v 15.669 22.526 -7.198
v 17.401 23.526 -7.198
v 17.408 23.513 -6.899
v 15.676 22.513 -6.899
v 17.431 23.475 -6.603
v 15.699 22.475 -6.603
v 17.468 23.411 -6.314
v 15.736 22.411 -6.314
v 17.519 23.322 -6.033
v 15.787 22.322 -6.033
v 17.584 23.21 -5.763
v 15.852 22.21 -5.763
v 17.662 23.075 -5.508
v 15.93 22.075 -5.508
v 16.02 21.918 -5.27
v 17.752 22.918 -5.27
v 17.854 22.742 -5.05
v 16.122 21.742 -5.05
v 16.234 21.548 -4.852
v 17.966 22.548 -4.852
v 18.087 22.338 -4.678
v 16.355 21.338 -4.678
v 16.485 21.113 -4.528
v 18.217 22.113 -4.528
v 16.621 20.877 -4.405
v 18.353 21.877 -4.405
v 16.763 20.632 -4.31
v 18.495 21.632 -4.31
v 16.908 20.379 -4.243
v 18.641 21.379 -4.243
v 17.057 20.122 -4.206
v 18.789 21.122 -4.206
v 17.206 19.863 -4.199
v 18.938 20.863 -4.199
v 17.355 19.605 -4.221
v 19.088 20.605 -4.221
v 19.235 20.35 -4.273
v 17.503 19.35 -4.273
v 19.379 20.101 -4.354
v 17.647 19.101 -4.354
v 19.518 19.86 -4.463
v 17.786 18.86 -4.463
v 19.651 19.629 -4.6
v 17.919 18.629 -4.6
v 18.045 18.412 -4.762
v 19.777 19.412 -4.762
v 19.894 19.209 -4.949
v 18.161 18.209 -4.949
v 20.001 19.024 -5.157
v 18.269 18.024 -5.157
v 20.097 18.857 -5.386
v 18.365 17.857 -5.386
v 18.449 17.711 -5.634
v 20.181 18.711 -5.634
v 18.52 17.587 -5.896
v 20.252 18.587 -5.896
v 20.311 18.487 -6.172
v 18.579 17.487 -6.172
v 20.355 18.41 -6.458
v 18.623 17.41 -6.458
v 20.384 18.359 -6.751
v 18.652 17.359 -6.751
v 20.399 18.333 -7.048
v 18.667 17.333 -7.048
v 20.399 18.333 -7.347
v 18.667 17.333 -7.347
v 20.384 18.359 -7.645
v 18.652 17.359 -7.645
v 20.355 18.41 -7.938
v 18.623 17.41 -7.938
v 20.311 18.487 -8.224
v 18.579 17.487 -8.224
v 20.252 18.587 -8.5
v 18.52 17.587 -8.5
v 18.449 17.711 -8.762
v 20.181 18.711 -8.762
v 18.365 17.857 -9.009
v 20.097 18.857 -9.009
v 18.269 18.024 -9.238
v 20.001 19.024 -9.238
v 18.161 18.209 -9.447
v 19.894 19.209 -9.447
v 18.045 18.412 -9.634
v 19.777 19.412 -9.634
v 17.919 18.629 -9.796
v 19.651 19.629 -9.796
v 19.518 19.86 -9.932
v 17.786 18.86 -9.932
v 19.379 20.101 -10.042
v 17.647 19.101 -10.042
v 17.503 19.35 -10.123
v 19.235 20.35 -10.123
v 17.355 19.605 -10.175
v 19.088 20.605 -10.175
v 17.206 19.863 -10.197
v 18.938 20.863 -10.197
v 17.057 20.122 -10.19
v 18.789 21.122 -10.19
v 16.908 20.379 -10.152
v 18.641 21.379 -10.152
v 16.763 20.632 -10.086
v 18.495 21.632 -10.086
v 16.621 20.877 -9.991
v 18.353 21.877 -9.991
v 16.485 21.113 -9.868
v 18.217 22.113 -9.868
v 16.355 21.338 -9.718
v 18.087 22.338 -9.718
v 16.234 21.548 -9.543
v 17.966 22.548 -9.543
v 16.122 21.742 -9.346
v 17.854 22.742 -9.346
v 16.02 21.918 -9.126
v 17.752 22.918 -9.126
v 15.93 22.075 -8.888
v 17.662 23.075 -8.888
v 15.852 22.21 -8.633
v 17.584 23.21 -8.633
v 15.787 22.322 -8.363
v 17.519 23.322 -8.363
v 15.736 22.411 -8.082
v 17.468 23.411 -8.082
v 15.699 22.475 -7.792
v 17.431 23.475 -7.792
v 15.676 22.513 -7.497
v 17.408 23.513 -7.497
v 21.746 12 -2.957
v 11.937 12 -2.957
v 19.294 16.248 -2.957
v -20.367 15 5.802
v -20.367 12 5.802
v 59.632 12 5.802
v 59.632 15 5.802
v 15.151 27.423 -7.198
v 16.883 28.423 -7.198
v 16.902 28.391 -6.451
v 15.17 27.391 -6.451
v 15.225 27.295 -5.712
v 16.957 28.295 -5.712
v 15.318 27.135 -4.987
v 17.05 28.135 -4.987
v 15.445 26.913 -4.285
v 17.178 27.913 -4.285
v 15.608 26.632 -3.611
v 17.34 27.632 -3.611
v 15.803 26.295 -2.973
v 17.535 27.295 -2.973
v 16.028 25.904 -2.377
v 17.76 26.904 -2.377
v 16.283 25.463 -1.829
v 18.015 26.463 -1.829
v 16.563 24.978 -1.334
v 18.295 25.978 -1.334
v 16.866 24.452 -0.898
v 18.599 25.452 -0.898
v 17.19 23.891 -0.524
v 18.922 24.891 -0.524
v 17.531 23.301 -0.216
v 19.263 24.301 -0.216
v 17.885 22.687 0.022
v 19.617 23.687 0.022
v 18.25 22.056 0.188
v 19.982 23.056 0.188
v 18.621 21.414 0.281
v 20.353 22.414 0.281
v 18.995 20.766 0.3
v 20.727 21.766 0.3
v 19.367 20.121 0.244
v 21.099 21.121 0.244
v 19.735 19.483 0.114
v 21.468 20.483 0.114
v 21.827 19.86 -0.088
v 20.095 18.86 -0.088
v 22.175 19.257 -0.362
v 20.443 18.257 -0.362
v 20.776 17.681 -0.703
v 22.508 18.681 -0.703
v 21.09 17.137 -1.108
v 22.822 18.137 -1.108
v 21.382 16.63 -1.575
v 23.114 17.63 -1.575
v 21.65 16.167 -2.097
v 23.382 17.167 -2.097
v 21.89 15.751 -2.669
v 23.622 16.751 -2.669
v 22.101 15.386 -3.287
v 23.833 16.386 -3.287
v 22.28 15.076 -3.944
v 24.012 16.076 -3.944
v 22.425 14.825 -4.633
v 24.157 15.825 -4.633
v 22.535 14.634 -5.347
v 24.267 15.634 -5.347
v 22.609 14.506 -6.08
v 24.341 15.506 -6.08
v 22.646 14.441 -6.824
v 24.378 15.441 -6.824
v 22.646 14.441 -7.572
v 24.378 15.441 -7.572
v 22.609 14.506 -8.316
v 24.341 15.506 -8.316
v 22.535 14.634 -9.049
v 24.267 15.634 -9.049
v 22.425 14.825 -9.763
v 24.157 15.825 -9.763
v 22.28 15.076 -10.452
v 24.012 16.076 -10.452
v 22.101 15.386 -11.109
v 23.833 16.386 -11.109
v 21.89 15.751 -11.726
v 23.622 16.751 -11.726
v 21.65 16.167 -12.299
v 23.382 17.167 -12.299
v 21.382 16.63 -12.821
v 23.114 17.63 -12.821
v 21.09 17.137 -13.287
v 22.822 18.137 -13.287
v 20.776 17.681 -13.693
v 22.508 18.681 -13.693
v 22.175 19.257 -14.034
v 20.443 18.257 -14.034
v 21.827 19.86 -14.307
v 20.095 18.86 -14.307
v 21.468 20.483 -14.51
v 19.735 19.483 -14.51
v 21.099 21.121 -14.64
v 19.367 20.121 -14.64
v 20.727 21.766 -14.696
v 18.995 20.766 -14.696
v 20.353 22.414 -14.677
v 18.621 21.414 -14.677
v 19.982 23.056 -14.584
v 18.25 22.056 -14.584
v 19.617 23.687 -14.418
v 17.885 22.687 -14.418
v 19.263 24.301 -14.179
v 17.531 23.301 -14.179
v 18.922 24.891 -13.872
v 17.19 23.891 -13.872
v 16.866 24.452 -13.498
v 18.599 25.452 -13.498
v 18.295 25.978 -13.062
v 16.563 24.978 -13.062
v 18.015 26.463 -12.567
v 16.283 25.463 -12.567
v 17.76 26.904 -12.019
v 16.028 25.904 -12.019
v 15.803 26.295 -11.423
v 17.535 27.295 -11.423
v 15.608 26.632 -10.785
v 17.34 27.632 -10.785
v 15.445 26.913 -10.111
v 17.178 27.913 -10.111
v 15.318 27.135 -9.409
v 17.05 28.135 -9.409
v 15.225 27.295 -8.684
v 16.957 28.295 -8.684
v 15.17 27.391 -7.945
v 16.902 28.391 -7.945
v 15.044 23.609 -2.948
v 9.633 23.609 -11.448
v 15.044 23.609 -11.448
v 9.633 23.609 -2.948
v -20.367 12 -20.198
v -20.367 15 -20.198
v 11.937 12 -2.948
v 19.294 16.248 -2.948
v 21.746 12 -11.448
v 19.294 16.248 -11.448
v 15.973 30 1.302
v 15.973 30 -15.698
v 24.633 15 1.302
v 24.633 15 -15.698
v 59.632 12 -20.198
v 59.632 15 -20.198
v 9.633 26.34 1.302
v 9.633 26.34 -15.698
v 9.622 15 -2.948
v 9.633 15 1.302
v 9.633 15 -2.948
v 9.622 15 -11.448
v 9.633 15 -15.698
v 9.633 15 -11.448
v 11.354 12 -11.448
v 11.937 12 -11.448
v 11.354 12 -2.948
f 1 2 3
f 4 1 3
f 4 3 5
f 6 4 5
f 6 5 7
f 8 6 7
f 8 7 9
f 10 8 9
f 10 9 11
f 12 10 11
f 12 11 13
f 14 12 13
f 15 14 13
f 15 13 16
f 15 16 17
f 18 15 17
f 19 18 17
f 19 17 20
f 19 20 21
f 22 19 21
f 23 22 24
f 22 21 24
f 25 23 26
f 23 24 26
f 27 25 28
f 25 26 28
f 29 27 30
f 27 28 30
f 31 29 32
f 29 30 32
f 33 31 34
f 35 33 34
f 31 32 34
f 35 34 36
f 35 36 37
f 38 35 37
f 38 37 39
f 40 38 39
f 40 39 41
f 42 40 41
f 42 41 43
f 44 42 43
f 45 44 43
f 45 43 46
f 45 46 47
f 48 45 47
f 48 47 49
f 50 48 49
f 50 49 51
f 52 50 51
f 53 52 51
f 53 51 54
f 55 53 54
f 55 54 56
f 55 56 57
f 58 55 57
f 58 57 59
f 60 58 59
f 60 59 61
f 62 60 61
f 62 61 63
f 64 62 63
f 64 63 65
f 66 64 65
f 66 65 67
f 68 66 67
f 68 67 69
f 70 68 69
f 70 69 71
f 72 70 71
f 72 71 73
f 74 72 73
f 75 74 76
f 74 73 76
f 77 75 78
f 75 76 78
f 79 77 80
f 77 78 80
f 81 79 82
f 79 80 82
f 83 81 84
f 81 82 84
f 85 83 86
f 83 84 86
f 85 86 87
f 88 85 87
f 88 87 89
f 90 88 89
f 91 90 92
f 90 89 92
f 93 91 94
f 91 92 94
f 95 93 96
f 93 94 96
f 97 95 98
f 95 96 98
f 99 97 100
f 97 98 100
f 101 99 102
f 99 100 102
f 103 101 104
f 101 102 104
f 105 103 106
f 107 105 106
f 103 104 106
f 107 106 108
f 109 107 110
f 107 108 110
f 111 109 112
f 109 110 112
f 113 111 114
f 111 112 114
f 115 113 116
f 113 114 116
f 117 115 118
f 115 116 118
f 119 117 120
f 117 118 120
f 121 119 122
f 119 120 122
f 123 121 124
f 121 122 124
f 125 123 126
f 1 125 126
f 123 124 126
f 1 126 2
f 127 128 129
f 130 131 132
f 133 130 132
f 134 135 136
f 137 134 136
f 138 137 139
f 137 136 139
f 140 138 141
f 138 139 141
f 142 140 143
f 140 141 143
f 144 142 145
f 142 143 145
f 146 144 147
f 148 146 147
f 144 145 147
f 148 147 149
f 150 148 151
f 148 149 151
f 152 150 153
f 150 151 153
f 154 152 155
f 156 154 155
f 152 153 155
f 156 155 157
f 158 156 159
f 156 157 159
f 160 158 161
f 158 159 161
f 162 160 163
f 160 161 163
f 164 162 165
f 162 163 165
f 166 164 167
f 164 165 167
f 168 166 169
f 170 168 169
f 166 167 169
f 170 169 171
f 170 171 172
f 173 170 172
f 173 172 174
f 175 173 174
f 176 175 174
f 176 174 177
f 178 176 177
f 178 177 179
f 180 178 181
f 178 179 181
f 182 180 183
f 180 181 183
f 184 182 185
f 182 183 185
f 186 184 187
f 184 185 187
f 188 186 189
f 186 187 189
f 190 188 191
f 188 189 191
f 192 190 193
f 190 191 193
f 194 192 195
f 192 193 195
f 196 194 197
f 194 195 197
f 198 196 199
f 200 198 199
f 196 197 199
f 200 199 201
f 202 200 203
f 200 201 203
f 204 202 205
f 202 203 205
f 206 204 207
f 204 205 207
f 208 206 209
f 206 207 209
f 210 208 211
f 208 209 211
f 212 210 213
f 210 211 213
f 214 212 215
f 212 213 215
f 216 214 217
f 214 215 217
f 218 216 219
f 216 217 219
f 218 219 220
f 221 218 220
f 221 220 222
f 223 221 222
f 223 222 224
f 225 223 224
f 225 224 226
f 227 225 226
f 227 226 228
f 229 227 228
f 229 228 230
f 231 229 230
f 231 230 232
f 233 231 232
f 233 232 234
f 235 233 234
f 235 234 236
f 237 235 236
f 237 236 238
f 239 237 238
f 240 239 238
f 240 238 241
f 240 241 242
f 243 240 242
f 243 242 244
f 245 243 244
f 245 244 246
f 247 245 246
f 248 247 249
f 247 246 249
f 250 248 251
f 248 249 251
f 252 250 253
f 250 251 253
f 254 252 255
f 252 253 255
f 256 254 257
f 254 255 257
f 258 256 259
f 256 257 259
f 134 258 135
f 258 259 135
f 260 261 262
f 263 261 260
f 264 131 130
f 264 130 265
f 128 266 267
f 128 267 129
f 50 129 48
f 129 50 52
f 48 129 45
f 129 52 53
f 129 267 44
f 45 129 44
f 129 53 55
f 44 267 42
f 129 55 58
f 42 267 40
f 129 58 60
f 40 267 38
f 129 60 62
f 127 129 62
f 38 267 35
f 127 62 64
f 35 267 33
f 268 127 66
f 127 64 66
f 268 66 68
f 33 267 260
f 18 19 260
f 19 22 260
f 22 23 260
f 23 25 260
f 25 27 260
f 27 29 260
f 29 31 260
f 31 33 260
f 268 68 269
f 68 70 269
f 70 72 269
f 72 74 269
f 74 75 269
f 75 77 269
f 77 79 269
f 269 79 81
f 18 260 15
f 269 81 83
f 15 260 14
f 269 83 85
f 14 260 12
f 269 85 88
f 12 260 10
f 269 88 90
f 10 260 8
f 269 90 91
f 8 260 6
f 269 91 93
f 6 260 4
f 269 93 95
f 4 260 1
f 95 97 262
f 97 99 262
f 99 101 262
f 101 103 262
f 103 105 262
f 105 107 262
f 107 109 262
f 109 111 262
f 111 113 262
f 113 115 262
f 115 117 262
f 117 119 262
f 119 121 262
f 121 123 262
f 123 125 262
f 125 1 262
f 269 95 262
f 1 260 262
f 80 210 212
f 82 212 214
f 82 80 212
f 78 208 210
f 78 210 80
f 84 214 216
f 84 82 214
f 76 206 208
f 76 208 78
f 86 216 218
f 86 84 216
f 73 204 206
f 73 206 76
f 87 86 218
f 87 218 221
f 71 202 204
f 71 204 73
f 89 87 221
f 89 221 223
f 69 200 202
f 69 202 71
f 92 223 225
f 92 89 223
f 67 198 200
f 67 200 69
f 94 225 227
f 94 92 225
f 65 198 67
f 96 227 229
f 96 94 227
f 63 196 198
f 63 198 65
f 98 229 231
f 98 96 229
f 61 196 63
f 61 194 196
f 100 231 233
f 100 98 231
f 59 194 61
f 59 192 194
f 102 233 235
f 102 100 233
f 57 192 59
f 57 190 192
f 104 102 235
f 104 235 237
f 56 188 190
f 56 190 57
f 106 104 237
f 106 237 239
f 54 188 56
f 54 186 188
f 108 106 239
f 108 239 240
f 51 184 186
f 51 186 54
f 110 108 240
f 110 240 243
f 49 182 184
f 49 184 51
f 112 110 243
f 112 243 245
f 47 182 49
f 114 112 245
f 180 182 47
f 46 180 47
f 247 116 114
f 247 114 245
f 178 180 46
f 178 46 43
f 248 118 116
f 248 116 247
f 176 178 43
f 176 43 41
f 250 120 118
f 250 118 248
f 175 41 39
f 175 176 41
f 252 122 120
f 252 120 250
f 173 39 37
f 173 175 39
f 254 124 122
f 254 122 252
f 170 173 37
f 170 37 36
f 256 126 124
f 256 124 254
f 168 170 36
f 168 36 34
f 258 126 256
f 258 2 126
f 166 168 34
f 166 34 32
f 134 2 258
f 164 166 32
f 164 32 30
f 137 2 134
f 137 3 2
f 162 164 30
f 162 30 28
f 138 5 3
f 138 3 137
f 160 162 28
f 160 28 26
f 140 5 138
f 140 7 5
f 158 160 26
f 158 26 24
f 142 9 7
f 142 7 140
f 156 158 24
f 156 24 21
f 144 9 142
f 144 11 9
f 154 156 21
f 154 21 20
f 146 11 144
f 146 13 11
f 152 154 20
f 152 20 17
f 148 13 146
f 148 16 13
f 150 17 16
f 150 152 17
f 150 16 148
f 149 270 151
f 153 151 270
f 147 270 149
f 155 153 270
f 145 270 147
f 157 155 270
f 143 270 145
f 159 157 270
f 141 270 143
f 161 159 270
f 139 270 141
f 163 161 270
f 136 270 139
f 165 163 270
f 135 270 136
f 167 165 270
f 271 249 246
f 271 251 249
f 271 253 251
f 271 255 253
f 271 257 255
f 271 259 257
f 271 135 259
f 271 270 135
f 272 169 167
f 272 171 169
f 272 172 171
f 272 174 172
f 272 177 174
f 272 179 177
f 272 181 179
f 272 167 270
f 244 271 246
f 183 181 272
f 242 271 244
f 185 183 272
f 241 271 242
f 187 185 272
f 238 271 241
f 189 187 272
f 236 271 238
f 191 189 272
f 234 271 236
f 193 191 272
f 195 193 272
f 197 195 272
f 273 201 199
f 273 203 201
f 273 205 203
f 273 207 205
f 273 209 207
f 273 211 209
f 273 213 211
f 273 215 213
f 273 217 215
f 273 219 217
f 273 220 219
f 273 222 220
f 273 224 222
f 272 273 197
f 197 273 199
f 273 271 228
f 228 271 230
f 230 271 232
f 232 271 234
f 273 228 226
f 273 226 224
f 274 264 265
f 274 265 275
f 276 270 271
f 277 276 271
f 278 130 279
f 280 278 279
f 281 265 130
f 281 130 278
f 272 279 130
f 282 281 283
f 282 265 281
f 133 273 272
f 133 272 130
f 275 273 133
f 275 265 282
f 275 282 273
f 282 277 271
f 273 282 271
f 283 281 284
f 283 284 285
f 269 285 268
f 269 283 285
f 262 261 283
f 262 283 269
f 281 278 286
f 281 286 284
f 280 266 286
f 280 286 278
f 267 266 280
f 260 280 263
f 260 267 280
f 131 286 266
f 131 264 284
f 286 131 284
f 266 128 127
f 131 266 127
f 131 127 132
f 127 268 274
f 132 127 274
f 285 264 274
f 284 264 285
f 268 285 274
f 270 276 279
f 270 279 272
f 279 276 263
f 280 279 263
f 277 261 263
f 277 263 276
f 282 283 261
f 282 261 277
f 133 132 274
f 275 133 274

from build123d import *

# Parameters (mm, degrees)
ESBO_O1_R                  = 1.5
RESSALTO_EXTRUS_O1_DEPTH   = 12
RESSALTO_EXTRUS_O1_2_DEPTH = 12
ESBO_O1_R_2                = 1.500000005
RESSALTO_EXTRUS_O1_3_DEPTH = 12
RESSALTO_EXTRUS_O1_4_DEPTH = 12
RESSALTO_EXTRUS_O1_5_DEPTH = 12
RESSALTO_EXTRUS_O1_6_DEPTH = 12
ESBO_O1_R_3                = 1.500000003
RESSALTO_EXTRUS_O1_7_DEPTH = 12
RESSALTO_EXTRUS_O1_8_DEPTH = 12
ESBO_O2_W                  = 79.998506149
ESBO_O2_H                  = 25.999999951
RESSALTO_EXTRUS_O2_DEPTH   = 3
ESBO_O3_W                  = 15
ESBO_O3_H                  = 17
RESSALTO_EXTRUS_O3_DEPTH   = 15
CHANFRO1_START             = 28.832866647
CHANFRO1_OUTLINE_W         = 17.320508076
CHANFRO1_OUTLINE_H         = 17
CHANFRO1_DEPTH             = 8.167133353
ESBO_O4_R                  = 7.5
CORTE_EXTRUS_O3_DEPTH      = 2
ESBO_O5_R                  = 3
CORTE_EXTRUS_O4_DEPTH      = 2
ESBO_O6_W                  = 8.5
ESBO_O6_H                  = 8.5
CORTE_EXTRUS_O5_DEPTH      = 9
ESBO_O7_W                  = 8.495190528
ESBO_O7_H                  = 8.490637191
CORTE_EXTRUS_O6_DEPTH      = 71.124048339
CORTE_EXTRUS_O7_START      = 1
ESBO_O10_W                 = 32.298347435
ESBO_O10_H                 = 12
CORTE_EXTRUS_O7_DEPTH      = 102
CORTE_EXTRUS_O9_REACH      = 63.707
ESBO_O13_W                 = 8.5
ESBO_O13_H                 = 3.123983639
ESBO_O14_W                 = 17
ESBO_O14_H                 = 3.169872981
CORTE_EXTRUS_O10_DEPTH     = 10


with BuildPart() as part:
    # Esboço1 → Ressalto-extrusão1 (new body)
    with BuildSketch(Plane(origin=(0, 0, 0), x_dir=(1, 0, 0), z_dir=(0, 1, 0))):
        with Locations(Location((-18.866927397, -4.302093178, 0), (0, 0, 270))):
            Circle(ESBO_O1_R)
    extrude(amount=RESSALTO_EXTRUS_O1_DEPTH)



with BuildPart() as body_2:
    # Esboço1 → Ressalto-extrus_o1 2 (new body)
    with BuildSketch(Plane(origin=(0, 0, 0), x_dir=(1, 0, 0), z_dir=(0, 1, 0))):
        with Locations(Location((-18.868421246, 18.697906773, 0), (0, 0, 270))):
            Circle(ESBO_O1_R)
    extrude(amount=RESSALTO_EXTRUS_O1_2_DEPTH)


with BuildPart() as body_3:
    # Esboço1 → Ressalto-extrus_o1 3 (new body)
    with BuildSketch(Plane(origin=(0, 0, 0), x_dir=(1, 0, 0), z_dir=(0, 1, 0))):
        with Locations(Location((3.131578748, 18.697379942, 0), (0, 0, 270))):
            Circle(ESBO_O1_R_2)
    extrude(amount=RESSALTO_EXTRUS_O1_3_DEPTH)


with BuildPart() as body_4:
    # Esboço1 → Ressalto-extrus_o1 4 (new body)
    with BuildSketch(Plane(origin=(0, 0, 0), x_dir=(1, 0, 0), z_dir=(0, 1, 0))):
        with Locations(Location((3.133072603, -4.302620009, 0), (0, 0, 270))):
            Circle(ESBO_O1_R)
    extrude(amount=RESSALTO_EXTRUS_O1_4_DEPTH)


with BuildPart() as body_5:
    # Esboço1 → Ressalto-extrus_o1 5 (new body)
    with BuildSketch(Plane(origin=(0, 0, 0), x_dir=(1, 0, 0), z_dir=(0, 1, 0))):
        with Locations(Location((58.131578752, 18.697406939, 0), (0, 0, 270))):
            Circle(ESBO_O1_R)
    extrude(amount=RESSALTO_EXTRUS_O1_5_DEPTH)


with BuildPart() as body_6:
    # Esboço1 → Ressalto-extrus_o1 6 (new body)
    with BuildSketch(Plane(origin=(0, 0, 0), x_dir=(1, 0, 0), z_dir=(0, 1, 0))):
        with Locations(Location((58.131578752, -4.302593061, 0), (0, 0, 270))):
            Circle(ESBO_O1_R)
    extrude(amount=RESSALTO_EXTRUS_O1_6_DEPTH)


with BuildPart() as body_7:
    # Esboço1 → Ressalto-extrus_o1 7 (new body)
    with BuildSketch(Plane(origin=(0, 0, 0), x_dir=(1, 0, 0), z_dir=(0, 1, 0))):
        with Locations(Location((26.131578746, 18.696829164, 0), (0, 0, 270))):
            Circle(ESBO_O1_R_3)
    extrude(amount=RESSALTO_EXTRUS_O1_7_DEPTH)


with BuildPart() as body_8:
    # Esboço1 → Ressalto-extrus_o1 8 (new body)
    with BuildSketch(Plane(origin=(0, 0, 0), x_dir=(1, 0, 0), z_dir=(0, 1, 0))):
        with Locations(Location((26.133072603, -4.303170787, 0), (0, 0, 270))):
            Circle(ESBO_O1_R)
    extrude(amount=RESSALTO_EXTRUS_O1_8_DEPTH)


with BuildPart() as part_1:
    add(part.part)

    add(body_2.part)  # Ressalto-extrusão2 merges body 2

    add(body_3.part)  # Ressalto-extrusão2 merges body 3

    add(body_4.part)  # Ressalto-extrusão2 merges body 4

    add(body_5.part)  # Ressalto-extrusão2 merges body 5

    add(body_6.part)  # Ressalto-extrusão2 merges body 6

    add(body_7.part)  # Ressalto-extrusão2 merges body 7

    add(body_8.part)  # Ressalto-extrusão2 merges body 8
    # Esboço2 → Ressalto-extrusão2 (add)
    with BuildSketch(Plane(origin=(0, 12, 0), x_dir=(1, 0, 0), z_dir=(0, 1, 0))):
        with Locations((19.632325677, 7.197906797)):
            Rectangle(ESBO_O2_W, ESBO_O2_H)
    extrude(amount=RESSALTO_EXTRUS_O2_DEPTH)

    # Esboço3 → Ressalto-extrusão3 (add)
    with BuildSketch(Plane(origin=(0, 15, 0), x_dir=(1, 0, 0), z_dir=(0, 1, 0))):
        with Locations((17.133072603, 7.197906773)):
            Rectangle(ESBO_O3_W, ESBO_O3_H)
    extrude(amount=RESSALTO_EXTRUS_O3_DEPTH)

    # Chanfro1: read off the stored shape, not the designer's step
    # Chanfro1 outline → Chanfro1 (cut)
    with BuildSketch(Plane(origin=(0, 0, 0), x_dir=(0.49999999999999767, -0.86602540378444, 0), z_dir=(0.8660254037844399, 0.49999999999999795, 0)).offset(CHANFRO1_START)):
        with Locations((-9.334098793, 7.197906773)):
            Rectangle(CHANFRO1_OUTLINE_W, CHANFRO1_OUTLINE_H)
    extrude(amount=CHANFRO1_DEPTH, mode=Mode.SUBTRACT)

    # Esboço4 → Corte-extrusão3 (cut)
    with BuildSketch(Plane(origin=(24.96999498, 14.416433324, 0), x_dir=(0, 0, -1), z_dir=(0.8660254037844396, 0.4999999999999982, 0))):
        with Locations(Location((7.197906773, 8.673844755, 0), (0, 0, 90))):
            Circle(ESBO_O4_R)
    extrude(amount=-CORTE_EXTRUS_O3_DEPTH, mode=Mode.SUBTRACT)

    # Esboço5 → Corte-extrusão4 (cut)
    with BuildSketch(Plane(origin=(23.237944173, 13.416433324, 0), x_dir=(0, 0, -1), z_dir=(0.8660254037844398, 0.4999999999999983, 0))):
        with Locations(Location((7.197906773, 8.673844755, 0), (0, 0, 90))):
            Circle(ESBO_O5_R)
    extrude(amount=-CORTE_EXTRUS_O4_DEPTH, mode=Mode.SUBTRACT)

    # Esboço6 → Corte-extrusão5 (cut)
    with BuildSketch(Plane(origin=(21.505893365, 12.416433324, 0), x_dir=(0, 0, -1), z_dir=(0.8660254037844396, 0.49999999999999833, 0))):
        with Locations((7.197906773, 8.673844755)):
            Rectangle(ESBO_O6_W, ESBO_O6_H)
    extrude(amount=-CORTE_EXTRUS_O5_DEPTH, mode=Mode.SUBTRACT)

    # Esboço7 → Corte-extrusão6 (cut, through all)
    with BuildSketch(Plane(origin=(-2.211922378, 3.831161941, 0), x_dir=(0.8660254037844396, 0.49999999999999845, 0), z_dir=(-0.49999999999999845, 0.8660254037844396, 0))):
        with Locations((20.585271383, 7.202588178)):
            Rectangle(ESBO_O7_W, ESBO_O7_H)
    extrude(amount=-CORTE_EXTRUS_O6_DEPTH, mode=Mode.SUBTRACT)

    # Esboço10 → Corte-extrusão7 (cut)
    with BuildSketch(Plane.ZY.offset(20.366927397).offset(CORTE_EXTRUS_O7_START)):
        with Locations((-7.642594808, 6)):
            Rectangle(ESBO_O10_W, ESBO_O10_H)
    extrude(amount=-CORTE_EXTRUS_O7_DEPTH, mode=Mode.SUBTRACT)

    # Corte-extrusão9: up to this plane
    corte_extrus_o9_end = Plane(origin=(21.505893365, 12.416433324, 0), z_dir=(0.8660254037844397, 0.49999999999999806, 0))
    # Esboço13 → Corte-extrusão9 (cut, up to the surface)
    with BuildSketch(Plane.ZY.offset(-9.633072603), mode=Mode.PRIVATE) as corte_extrus_o9_sk1:
        with Locations((-7.197906773, 22.046819377)):
            Rectangle(ESBO_O13_W, ESBO_O13_H)
    corte_extrus_o9_tool1 = split(extrude(corte_extrus_o9_sk1.sketch, amount=-CORTE_EXTRUS_O9_REACH, mode=Mode.PRIVATE), bisect_by=corte_extrus_o9_end, keep=Keep.BOTH, mode=Mode.PRIVATE)
    add(corte_extrus_o9_tool1.solids().sort_by_distance((9.633073, 22.046819, -7.197907))[0], mode=Mode.SUBTRACT)

    # Esboço14 → Corte-extrusão10 (cut)
    with BuildSketch(Plane(origin=(24.96999498, 14.416433324, 0), x_dir=(0, 0, -1), z_dir=(0.8660254037844396, 0.4999999999999985, 0))):
        with Locations((7.197906773, 19.579289321)):
            Rectangle(ESBO_O14_W, ESBO_O14_H)
    extrude(amount=-CORTE_EXTRUS_O10_DEPTH, mode=Mode.SUBTRACT)


solid = part_1.part
